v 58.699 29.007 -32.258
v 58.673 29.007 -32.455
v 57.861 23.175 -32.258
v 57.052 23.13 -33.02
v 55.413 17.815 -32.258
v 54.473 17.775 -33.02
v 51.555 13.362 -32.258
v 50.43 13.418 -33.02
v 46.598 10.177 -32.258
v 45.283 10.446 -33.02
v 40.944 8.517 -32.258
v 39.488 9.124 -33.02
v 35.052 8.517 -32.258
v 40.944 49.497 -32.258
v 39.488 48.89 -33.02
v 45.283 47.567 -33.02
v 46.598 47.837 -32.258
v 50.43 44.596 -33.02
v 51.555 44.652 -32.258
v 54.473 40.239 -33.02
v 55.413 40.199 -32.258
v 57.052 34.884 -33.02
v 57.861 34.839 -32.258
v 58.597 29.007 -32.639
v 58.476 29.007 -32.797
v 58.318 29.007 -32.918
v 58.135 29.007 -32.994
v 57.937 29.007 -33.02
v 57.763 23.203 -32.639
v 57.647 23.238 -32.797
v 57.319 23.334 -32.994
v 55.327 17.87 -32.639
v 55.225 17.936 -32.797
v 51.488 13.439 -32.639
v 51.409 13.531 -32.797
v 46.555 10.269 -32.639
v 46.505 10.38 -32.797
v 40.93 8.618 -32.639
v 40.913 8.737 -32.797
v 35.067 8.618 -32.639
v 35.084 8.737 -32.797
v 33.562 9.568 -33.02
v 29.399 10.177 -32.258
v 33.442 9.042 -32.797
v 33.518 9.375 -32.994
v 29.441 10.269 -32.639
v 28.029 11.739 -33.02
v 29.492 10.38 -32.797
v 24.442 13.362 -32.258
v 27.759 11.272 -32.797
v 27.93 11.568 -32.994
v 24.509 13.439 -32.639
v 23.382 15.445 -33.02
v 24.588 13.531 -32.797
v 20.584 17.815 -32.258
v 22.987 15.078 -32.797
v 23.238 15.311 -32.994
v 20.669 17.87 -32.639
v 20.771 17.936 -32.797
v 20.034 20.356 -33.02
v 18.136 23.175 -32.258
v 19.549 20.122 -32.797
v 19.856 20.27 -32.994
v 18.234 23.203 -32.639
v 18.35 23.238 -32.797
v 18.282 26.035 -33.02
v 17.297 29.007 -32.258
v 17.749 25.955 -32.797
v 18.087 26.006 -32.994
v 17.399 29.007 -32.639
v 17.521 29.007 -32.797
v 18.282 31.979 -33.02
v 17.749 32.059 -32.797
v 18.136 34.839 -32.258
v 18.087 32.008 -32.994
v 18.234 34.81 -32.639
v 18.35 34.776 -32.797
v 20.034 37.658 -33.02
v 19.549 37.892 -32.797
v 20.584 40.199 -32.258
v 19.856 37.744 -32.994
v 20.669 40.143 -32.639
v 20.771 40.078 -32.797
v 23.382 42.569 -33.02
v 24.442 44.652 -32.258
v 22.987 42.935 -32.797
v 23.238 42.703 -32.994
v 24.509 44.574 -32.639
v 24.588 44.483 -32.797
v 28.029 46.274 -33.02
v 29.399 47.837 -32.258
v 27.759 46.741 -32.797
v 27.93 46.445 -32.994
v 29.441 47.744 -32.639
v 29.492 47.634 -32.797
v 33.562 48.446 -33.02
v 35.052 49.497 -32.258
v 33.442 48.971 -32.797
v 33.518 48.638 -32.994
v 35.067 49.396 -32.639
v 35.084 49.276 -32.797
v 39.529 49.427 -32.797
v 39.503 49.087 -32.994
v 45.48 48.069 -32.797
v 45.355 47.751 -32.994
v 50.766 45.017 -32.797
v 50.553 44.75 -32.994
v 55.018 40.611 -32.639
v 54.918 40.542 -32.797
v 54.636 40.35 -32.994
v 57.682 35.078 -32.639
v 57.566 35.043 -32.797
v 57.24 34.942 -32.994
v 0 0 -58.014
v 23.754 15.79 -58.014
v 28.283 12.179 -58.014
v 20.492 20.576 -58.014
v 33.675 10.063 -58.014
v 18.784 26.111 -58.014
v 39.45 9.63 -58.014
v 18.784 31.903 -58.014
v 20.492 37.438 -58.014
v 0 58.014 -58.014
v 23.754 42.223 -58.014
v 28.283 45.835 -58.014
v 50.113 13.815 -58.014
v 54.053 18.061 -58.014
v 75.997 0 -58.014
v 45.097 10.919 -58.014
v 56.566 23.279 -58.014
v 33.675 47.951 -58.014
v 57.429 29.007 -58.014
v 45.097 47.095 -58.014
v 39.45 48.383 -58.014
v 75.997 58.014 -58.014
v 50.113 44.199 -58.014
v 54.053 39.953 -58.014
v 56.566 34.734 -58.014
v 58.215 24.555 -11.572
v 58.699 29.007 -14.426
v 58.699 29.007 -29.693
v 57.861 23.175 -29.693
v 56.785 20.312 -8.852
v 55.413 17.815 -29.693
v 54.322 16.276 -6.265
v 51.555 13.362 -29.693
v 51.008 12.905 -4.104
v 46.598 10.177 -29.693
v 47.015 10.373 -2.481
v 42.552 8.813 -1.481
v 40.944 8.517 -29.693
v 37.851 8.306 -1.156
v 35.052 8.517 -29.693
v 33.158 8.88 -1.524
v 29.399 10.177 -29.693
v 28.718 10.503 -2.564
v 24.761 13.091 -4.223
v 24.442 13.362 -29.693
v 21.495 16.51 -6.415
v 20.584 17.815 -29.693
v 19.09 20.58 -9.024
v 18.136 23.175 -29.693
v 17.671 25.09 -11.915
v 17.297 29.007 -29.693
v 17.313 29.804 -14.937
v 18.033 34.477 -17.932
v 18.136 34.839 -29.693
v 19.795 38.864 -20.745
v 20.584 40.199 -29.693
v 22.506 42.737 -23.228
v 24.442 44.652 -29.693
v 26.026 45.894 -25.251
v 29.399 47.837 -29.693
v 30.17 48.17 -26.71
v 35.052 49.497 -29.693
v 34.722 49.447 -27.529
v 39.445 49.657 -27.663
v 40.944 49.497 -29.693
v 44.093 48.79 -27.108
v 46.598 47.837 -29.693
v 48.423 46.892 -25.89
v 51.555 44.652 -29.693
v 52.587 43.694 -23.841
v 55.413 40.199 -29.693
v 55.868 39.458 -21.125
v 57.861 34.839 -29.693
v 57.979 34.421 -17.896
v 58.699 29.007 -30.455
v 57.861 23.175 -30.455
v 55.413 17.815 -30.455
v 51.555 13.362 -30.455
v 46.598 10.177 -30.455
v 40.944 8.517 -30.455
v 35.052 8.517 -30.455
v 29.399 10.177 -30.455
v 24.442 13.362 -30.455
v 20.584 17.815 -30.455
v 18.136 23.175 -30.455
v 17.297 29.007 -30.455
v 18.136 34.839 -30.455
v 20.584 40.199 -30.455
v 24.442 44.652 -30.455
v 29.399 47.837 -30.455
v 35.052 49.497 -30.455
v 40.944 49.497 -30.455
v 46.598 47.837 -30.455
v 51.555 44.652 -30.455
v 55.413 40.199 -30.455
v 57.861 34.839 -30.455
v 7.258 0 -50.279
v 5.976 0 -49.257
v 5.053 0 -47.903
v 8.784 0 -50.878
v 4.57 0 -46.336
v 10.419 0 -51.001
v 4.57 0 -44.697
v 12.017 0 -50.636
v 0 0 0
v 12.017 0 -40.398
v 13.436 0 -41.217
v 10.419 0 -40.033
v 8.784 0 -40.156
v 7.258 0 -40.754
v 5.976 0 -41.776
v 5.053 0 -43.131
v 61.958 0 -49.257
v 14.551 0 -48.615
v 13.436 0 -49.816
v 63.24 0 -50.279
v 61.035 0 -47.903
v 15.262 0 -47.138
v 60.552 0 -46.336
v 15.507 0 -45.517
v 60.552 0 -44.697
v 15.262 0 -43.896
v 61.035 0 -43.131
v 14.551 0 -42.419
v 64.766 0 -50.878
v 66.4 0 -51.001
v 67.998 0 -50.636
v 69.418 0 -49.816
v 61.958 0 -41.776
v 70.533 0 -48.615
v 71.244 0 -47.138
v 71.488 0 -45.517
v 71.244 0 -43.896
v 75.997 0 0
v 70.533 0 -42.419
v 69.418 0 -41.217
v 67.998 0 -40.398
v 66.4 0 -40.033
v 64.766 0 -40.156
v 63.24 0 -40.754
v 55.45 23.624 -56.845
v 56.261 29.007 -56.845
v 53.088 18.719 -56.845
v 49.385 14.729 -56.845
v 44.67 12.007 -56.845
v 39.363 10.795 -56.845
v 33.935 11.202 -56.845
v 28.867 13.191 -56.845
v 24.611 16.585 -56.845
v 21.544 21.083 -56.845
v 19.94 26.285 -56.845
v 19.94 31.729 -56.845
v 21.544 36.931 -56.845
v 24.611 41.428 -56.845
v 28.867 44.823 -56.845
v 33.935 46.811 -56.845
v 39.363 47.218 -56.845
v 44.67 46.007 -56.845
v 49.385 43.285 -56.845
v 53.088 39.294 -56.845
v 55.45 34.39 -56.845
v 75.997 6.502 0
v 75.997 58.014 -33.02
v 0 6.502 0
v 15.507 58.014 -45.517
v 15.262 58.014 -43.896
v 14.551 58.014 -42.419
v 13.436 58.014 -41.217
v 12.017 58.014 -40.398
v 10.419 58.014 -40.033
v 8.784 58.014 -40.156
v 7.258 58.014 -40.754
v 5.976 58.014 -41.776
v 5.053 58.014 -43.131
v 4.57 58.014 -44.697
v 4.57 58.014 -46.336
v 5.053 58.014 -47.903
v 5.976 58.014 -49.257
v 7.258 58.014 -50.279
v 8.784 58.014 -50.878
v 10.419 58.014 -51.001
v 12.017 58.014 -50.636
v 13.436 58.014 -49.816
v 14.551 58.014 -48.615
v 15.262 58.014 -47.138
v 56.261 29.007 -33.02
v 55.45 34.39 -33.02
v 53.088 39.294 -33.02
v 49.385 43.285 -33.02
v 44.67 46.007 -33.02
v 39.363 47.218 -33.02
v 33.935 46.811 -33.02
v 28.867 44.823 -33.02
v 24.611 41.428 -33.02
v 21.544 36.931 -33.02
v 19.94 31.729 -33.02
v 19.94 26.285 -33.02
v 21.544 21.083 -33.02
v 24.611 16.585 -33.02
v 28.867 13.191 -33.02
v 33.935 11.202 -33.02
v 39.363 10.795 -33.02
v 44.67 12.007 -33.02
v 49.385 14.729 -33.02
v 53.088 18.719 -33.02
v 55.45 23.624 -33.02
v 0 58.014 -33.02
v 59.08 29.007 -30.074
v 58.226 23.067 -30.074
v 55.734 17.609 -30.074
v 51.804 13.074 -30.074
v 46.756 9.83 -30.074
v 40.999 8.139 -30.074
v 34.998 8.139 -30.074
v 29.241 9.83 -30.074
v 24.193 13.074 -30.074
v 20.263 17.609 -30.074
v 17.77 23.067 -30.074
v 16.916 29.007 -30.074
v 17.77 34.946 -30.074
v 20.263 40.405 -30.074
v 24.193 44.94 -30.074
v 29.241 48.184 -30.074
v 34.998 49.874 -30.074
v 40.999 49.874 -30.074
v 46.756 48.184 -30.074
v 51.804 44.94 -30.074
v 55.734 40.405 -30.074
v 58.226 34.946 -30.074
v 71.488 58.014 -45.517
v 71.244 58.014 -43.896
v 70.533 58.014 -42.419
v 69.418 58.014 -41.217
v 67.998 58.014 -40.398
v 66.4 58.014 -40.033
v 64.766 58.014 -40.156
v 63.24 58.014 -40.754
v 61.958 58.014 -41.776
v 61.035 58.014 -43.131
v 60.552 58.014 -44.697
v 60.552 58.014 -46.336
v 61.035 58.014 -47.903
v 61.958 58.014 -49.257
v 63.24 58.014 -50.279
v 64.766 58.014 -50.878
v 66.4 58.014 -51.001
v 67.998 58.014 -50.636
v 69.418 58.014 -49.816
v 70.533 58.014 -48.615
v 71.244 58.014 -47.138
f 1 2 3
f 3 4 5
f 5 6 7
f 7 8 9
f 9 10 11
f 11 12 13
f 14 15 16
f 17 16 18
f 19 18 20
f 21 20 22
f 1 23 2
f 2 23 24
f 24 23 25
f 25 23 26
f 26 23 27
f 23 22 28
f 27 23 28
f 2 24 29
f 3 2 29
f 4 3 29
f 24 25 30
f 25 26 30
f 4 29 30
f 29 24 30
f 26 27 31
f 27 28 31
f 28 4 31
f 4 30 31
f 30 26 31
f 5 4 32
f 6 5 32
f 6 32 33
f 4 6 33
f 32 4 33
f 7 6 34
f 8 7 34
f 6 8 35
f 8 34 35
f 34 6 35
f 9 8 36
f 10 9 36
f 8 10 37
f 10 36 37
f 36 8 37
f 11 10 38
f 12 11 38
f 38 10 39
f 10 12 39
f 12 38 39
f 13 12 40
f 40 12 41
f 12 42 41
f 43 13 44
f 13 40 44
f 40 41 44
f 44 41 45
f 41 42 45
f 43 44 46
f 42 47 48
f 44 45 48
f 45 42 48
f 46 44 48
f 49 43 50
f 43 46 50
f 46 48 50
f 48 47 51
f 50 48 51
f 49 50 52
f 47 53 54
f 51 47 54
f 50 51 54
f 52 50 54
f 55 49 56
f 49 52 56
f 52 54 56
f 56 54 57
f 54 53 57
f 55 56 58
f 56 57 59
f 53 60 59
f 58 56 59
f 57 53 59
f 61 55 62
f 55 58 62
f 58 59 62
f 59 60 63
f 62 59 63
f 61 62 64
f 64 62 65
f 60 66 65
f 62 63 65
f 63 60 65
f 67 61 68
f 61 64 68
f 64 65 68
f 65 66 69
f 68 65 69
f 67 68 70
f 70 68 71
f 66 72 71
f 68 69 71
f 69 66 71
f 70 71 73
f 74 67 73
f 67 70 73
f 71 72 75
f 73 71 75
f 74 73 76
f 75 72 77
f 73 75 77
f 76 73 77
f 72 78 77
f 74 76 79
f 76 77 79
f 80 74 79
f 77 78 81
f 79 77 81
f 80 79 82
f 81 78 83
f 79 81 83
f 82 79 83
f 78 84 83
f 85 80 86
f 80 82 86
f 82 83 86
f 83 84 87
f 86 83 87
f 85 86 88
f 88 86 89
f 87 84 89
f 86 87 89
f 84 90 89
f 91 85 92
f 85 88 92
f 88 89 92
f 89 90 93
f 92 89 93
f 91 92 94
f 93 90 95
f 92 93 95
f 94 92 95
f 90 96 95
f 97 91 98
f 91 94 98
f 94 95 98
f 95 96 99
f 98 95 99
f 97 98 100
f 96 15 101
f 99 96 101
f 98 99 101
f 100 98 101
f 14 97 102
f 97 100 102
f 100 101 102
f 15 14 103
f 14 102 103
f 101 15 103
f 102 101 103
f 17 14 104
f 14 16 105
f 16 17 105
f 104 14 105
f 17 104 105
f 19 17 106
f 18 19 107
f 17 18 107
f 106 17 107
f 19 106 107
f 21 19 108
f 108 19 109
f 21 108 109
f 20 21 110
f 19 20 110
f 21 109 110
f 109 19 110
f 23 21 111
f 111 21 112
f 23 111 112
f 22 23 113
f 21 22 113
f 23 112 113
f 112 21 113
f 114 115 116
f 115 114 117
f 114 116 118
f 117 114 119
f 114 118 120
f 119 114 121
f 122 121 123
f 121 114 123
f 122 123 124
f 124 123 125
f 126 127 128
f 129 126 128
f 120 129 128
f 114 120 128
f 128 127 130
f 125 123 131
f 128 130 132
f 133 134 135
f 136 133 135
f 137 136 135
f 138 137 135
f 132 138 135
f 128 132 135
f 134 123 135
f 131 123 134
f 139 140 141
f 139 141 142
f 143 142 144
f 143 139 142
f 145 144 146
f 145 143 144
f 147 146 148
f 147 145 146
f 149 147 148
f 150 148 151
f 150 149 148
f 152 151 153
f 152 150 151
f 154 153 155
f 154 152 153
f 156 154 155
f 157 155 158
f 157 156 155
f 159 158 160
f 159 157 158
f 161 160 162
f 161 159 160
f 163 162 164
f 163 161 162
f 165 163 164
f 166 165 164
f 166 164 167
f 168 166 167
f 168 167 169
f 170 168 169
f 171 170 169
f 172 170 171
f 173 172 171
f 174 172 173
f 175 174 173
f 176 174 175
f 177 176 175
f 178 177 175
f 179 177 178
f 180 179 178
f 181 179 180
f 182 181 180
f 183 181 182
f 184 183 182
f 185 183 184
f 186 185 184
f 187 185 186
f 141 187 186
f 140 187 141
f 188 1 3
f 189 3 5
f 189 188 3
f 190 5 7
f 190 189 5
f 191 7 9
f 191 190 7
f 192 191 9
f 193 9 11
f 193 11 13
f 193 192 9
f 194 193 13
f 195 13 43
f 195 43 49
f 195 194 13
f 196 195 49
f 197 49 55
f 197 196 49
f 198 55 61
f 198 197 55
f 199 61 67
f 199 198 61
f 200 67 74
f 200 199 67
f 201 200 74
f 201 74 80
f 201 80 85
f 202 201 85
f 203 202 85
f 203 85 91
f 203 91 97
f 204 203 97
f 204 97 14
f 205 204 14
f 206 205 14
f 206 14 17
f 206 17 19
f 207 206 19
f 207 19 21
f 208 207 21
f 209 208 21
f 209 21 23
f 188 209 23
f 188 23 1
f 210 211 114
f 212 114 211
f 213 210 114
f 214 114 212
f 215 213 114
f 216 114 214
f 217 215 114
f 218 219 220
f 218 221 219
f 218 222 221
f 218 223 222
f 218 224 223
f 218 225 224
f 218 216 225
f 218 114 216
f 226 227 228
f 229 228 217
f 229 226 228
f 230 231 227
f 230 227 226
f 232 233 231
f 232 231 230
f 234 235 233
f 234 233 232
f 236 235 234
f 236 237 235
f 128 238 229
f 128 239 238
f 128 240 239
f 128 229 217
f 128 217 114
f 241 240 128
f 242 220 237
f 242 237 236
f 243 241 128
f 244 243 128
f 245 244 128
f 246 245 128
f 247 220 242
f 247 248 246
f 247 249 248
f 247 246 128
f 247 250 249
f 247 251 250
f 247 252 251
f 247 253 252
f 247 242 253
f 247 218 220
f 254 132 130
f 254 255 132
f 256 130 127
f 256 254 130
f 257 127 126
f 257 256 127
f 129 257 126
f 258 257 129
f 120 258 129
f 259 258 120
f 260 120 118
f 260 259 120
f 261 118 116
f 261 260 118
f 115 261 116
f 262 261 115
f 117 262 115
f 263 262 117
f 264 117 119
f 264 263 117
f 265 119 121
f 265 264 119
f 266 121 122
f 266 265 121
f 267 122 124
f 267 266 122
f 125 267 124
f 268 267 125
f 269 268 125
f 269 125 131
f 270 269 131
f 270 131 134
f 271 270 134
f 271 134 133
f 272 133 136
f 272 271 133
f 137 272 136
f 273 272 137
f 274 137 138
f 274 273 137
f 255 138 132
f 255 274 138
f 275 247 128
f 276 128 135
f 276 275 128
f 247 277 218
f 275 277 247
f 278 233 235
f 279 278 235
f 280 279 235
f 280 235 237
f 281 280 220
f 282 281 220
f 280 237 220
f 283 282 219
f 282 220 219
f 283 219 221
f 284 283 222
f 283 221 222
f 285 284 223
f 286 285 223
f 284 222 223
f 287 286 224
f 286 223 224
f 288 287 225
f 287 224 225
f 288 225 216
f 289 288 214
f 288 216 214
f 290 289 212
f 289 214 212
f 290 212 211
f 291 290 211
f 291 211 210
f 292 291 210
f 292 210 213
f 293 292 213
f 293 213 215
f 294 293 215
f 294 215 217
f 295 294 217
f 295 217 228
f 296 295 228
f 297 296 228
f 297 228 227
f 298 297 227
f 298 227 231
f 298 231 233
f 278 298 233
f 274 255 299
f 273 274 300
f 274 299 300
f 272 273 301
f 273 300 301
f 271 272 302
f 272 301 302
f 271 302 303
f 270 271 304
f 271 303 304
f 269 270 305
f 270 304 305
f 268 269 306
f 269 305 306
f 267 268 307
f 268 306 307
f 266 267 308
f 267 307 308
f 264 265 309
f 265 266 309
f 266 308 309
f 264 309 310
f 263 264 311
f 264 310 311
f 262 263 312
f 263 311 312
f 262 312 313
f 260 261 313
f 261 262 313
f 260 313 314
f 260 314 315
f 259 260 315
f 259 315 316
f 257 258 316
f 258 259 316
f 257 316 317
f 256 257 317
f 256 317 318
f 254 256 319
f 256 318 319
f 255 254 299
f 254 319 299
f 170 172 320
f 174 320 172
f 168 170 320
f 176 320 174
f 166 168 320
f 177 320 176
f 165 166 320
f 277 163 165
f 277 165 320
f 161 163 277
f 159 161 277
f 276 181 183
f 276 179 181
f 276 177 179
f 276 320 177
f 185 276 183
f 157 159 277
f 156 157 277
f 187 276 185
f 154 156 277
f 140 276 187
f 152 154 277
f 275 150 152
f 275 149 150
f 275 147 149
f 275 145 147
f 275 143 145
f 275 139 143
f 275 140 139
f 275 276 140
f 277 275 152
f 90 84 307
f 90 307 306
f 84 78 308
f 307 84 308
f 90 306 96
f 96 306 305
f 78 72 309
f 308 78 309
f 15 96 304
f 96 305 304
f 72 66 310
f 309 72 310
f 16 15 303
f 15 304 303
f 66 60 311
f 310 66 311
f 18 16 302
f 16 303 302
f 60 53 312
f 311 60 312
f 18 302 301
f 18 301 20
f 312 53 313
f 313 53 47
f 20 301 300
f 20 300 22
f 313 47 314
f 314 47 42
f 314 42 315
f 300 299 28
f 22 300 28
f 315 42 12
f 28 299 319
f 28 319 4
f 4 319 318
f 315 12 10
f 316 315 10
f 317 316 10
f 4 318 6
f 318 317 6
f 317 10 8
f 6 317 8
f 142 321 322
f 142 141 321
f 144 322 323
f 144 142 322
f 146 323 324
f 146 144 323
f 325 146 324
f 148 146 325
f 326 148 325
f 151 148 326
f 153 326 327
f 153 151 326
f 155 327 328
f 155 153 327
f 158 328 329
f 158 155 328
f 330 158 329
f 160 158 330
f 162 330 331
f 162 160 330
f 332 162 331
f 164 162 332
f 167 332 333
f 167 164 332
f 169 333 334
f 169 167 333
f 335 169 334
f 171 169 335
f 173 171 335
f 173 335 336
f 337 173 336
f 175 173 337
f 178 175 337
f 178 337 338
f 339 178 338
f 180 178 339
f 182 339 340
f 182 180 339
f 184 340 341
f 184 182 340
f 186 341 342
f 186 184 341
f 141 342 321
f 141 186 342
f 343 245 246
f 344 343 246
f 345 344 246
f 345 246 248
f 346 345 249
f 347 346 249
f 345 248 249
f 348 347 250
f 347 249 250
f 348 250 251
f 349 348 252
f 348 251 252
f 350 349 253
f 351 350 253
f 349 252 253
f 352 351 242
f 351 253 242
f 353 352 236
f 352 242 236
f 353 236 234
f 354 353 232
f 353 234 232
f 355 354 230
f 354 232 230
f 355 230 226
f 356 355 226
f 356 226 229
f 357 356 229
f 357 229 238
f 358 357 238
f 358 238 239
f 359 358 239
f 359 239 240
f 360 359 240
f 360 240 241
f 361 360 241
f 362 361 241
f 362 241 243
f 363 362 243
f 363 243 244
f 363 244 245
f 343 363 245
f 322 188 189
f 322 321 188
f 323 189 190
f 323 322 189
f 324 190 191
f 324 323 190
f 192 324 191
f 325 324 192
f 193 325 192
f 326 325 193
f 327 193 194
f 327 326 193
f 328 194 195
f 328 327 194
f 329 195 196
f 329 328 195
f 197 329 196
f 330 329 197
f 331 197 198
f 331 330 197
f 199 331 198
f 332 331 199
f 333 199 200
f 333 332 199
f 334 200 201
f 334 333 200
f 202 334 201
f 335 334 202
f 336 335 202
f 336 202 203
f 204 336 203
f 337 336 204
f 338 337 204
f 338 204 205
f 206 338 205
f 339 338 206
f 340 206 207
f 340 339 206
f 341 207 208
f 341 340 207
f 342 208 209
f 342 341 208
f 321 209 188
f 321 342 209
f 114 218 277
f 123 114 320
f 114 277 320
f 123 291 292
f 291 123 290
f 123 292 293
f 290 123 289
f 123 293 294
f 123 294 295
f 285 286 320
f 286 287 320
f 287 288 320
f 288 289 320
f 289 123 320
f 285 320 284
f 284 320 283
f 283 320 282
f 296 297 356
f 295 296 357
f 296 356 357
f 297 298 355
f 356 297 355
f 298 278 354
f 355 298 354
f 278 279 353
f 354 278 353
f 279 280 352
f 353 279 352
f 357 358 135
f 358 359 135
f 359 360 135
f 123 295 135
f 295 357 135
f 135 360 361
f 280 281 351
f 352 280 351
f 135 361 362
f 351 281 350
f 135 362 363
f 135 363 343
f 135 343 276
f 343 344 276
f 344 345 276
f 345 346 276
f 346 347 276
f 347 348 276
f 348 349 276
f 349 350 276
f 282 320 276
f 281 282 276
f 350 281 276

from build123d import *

# Parameters (mm, degrees)
SKETCH1_W          = 75.9968
SKETCH1_H          = 58.0136
SKETCH1_R          = 18.2625
EXTRUDE1_DEPTH     = 58.0136
CUT_EXTRUDE1_DEPTH = 76.9968
SKETCH3_R          = 20.701
CUT_EXTRUDE2_DEPTH = 33.02
FILLET1_R          = 0.762
HOLE1_D            = 10.9982
HOLE1_DEPTH        = 58.0136


with BuildPart() as part:
    # Sketch1 → Extrude1 (new body)
    with BuildSketch(Plane.XY):
        with Locations((37.9984, 29.0068)):
            Rectangle(SKETCH1_W, SKETCH1_H)
        with Locations((37.9984, 29.0068)):
            Circle(SKETCH1_R, mode=Mode.SUBTRACT)
    extrude(amount=-EXTRUDE1_DEPTH)

    # Sketch2 → Cut-Extrude1 (cut, through all)
    with BuildSketch(Plane(origin=(75.9968, 0, 0), x_dir=(0, 0, -1), z_dir=(1, 0, 0))):
        Polygon((0, 58.0136), (33.02, 58.0136), (0, 6.5024), align=None)
    extrude(amount=-CUT_EXTRUDE1_DEPTH, mode=Mode.SUBTRACT)

    # Sketch3 → Cut-Extrude2 (cut)
    with BuildSketch(Plane(origin=(0, 0, 0), x_dir=(-1, 0, 0), z_dir=(0, 0, -1))):
        with Locations(Location((-37.9984, 29.0068, 0), (0, 0, 180))):  # turned: the seam where the file's is
            Circle(SKETCH3_R)
    extrude(amount=CUT_EXTRUDE2_DEPTH, mode=Mode.SUBTRACT)

    # Fillet1
    fillet1_edges = [part.edges().sort_by_distance(p)[0] for p in [
        (17.2974, 29.0068, -33.02),
    ]]
    fillet(fillet1_edges, radius=FILLET1_R)

    # Hole1
    with Locations(Plane(origin=(0, 58.0136, 0), x_dir=(-1, 0, 0), z_dir=(0, 1, 0))):
        with Locations((-10.0076, -45.5168), (-65.9892, -45.5168)):
            Hole(HOLE1_D / 2, depth=HOLE1_DEPTH)

    # Sketch6 → Cut-Revolve1 (revolve, cut)
    with BuildSketch(Plane(origin=(0, 29.0068, 0), x_dir=(-1, 0, 0), z_dir=(0, 1, 0)), mode=Mode.PRIVATE) as cut_revolve1_sk:
        Polygon((-17.2974, -29.6926), (-17.2974, -30.4546), (-16.9164, -30.0736), align=None)
        Polygon((-19.7359, -56.8451), (-19.7359, -58.0136), (-18.5674, -58.0136), align=None)
    revolve(cut_revolve1_sk.sketch.rotate(Axis((37.9984, 29.0068, 17.508123997), (0, 0, -1)), 180), axis=Axis((37.9984, 29.0068, 17.508123997), (0, 0, -1)), mode=Mode.SUBTRACT)  # turned: the seam where the file's is


solid = part.part
